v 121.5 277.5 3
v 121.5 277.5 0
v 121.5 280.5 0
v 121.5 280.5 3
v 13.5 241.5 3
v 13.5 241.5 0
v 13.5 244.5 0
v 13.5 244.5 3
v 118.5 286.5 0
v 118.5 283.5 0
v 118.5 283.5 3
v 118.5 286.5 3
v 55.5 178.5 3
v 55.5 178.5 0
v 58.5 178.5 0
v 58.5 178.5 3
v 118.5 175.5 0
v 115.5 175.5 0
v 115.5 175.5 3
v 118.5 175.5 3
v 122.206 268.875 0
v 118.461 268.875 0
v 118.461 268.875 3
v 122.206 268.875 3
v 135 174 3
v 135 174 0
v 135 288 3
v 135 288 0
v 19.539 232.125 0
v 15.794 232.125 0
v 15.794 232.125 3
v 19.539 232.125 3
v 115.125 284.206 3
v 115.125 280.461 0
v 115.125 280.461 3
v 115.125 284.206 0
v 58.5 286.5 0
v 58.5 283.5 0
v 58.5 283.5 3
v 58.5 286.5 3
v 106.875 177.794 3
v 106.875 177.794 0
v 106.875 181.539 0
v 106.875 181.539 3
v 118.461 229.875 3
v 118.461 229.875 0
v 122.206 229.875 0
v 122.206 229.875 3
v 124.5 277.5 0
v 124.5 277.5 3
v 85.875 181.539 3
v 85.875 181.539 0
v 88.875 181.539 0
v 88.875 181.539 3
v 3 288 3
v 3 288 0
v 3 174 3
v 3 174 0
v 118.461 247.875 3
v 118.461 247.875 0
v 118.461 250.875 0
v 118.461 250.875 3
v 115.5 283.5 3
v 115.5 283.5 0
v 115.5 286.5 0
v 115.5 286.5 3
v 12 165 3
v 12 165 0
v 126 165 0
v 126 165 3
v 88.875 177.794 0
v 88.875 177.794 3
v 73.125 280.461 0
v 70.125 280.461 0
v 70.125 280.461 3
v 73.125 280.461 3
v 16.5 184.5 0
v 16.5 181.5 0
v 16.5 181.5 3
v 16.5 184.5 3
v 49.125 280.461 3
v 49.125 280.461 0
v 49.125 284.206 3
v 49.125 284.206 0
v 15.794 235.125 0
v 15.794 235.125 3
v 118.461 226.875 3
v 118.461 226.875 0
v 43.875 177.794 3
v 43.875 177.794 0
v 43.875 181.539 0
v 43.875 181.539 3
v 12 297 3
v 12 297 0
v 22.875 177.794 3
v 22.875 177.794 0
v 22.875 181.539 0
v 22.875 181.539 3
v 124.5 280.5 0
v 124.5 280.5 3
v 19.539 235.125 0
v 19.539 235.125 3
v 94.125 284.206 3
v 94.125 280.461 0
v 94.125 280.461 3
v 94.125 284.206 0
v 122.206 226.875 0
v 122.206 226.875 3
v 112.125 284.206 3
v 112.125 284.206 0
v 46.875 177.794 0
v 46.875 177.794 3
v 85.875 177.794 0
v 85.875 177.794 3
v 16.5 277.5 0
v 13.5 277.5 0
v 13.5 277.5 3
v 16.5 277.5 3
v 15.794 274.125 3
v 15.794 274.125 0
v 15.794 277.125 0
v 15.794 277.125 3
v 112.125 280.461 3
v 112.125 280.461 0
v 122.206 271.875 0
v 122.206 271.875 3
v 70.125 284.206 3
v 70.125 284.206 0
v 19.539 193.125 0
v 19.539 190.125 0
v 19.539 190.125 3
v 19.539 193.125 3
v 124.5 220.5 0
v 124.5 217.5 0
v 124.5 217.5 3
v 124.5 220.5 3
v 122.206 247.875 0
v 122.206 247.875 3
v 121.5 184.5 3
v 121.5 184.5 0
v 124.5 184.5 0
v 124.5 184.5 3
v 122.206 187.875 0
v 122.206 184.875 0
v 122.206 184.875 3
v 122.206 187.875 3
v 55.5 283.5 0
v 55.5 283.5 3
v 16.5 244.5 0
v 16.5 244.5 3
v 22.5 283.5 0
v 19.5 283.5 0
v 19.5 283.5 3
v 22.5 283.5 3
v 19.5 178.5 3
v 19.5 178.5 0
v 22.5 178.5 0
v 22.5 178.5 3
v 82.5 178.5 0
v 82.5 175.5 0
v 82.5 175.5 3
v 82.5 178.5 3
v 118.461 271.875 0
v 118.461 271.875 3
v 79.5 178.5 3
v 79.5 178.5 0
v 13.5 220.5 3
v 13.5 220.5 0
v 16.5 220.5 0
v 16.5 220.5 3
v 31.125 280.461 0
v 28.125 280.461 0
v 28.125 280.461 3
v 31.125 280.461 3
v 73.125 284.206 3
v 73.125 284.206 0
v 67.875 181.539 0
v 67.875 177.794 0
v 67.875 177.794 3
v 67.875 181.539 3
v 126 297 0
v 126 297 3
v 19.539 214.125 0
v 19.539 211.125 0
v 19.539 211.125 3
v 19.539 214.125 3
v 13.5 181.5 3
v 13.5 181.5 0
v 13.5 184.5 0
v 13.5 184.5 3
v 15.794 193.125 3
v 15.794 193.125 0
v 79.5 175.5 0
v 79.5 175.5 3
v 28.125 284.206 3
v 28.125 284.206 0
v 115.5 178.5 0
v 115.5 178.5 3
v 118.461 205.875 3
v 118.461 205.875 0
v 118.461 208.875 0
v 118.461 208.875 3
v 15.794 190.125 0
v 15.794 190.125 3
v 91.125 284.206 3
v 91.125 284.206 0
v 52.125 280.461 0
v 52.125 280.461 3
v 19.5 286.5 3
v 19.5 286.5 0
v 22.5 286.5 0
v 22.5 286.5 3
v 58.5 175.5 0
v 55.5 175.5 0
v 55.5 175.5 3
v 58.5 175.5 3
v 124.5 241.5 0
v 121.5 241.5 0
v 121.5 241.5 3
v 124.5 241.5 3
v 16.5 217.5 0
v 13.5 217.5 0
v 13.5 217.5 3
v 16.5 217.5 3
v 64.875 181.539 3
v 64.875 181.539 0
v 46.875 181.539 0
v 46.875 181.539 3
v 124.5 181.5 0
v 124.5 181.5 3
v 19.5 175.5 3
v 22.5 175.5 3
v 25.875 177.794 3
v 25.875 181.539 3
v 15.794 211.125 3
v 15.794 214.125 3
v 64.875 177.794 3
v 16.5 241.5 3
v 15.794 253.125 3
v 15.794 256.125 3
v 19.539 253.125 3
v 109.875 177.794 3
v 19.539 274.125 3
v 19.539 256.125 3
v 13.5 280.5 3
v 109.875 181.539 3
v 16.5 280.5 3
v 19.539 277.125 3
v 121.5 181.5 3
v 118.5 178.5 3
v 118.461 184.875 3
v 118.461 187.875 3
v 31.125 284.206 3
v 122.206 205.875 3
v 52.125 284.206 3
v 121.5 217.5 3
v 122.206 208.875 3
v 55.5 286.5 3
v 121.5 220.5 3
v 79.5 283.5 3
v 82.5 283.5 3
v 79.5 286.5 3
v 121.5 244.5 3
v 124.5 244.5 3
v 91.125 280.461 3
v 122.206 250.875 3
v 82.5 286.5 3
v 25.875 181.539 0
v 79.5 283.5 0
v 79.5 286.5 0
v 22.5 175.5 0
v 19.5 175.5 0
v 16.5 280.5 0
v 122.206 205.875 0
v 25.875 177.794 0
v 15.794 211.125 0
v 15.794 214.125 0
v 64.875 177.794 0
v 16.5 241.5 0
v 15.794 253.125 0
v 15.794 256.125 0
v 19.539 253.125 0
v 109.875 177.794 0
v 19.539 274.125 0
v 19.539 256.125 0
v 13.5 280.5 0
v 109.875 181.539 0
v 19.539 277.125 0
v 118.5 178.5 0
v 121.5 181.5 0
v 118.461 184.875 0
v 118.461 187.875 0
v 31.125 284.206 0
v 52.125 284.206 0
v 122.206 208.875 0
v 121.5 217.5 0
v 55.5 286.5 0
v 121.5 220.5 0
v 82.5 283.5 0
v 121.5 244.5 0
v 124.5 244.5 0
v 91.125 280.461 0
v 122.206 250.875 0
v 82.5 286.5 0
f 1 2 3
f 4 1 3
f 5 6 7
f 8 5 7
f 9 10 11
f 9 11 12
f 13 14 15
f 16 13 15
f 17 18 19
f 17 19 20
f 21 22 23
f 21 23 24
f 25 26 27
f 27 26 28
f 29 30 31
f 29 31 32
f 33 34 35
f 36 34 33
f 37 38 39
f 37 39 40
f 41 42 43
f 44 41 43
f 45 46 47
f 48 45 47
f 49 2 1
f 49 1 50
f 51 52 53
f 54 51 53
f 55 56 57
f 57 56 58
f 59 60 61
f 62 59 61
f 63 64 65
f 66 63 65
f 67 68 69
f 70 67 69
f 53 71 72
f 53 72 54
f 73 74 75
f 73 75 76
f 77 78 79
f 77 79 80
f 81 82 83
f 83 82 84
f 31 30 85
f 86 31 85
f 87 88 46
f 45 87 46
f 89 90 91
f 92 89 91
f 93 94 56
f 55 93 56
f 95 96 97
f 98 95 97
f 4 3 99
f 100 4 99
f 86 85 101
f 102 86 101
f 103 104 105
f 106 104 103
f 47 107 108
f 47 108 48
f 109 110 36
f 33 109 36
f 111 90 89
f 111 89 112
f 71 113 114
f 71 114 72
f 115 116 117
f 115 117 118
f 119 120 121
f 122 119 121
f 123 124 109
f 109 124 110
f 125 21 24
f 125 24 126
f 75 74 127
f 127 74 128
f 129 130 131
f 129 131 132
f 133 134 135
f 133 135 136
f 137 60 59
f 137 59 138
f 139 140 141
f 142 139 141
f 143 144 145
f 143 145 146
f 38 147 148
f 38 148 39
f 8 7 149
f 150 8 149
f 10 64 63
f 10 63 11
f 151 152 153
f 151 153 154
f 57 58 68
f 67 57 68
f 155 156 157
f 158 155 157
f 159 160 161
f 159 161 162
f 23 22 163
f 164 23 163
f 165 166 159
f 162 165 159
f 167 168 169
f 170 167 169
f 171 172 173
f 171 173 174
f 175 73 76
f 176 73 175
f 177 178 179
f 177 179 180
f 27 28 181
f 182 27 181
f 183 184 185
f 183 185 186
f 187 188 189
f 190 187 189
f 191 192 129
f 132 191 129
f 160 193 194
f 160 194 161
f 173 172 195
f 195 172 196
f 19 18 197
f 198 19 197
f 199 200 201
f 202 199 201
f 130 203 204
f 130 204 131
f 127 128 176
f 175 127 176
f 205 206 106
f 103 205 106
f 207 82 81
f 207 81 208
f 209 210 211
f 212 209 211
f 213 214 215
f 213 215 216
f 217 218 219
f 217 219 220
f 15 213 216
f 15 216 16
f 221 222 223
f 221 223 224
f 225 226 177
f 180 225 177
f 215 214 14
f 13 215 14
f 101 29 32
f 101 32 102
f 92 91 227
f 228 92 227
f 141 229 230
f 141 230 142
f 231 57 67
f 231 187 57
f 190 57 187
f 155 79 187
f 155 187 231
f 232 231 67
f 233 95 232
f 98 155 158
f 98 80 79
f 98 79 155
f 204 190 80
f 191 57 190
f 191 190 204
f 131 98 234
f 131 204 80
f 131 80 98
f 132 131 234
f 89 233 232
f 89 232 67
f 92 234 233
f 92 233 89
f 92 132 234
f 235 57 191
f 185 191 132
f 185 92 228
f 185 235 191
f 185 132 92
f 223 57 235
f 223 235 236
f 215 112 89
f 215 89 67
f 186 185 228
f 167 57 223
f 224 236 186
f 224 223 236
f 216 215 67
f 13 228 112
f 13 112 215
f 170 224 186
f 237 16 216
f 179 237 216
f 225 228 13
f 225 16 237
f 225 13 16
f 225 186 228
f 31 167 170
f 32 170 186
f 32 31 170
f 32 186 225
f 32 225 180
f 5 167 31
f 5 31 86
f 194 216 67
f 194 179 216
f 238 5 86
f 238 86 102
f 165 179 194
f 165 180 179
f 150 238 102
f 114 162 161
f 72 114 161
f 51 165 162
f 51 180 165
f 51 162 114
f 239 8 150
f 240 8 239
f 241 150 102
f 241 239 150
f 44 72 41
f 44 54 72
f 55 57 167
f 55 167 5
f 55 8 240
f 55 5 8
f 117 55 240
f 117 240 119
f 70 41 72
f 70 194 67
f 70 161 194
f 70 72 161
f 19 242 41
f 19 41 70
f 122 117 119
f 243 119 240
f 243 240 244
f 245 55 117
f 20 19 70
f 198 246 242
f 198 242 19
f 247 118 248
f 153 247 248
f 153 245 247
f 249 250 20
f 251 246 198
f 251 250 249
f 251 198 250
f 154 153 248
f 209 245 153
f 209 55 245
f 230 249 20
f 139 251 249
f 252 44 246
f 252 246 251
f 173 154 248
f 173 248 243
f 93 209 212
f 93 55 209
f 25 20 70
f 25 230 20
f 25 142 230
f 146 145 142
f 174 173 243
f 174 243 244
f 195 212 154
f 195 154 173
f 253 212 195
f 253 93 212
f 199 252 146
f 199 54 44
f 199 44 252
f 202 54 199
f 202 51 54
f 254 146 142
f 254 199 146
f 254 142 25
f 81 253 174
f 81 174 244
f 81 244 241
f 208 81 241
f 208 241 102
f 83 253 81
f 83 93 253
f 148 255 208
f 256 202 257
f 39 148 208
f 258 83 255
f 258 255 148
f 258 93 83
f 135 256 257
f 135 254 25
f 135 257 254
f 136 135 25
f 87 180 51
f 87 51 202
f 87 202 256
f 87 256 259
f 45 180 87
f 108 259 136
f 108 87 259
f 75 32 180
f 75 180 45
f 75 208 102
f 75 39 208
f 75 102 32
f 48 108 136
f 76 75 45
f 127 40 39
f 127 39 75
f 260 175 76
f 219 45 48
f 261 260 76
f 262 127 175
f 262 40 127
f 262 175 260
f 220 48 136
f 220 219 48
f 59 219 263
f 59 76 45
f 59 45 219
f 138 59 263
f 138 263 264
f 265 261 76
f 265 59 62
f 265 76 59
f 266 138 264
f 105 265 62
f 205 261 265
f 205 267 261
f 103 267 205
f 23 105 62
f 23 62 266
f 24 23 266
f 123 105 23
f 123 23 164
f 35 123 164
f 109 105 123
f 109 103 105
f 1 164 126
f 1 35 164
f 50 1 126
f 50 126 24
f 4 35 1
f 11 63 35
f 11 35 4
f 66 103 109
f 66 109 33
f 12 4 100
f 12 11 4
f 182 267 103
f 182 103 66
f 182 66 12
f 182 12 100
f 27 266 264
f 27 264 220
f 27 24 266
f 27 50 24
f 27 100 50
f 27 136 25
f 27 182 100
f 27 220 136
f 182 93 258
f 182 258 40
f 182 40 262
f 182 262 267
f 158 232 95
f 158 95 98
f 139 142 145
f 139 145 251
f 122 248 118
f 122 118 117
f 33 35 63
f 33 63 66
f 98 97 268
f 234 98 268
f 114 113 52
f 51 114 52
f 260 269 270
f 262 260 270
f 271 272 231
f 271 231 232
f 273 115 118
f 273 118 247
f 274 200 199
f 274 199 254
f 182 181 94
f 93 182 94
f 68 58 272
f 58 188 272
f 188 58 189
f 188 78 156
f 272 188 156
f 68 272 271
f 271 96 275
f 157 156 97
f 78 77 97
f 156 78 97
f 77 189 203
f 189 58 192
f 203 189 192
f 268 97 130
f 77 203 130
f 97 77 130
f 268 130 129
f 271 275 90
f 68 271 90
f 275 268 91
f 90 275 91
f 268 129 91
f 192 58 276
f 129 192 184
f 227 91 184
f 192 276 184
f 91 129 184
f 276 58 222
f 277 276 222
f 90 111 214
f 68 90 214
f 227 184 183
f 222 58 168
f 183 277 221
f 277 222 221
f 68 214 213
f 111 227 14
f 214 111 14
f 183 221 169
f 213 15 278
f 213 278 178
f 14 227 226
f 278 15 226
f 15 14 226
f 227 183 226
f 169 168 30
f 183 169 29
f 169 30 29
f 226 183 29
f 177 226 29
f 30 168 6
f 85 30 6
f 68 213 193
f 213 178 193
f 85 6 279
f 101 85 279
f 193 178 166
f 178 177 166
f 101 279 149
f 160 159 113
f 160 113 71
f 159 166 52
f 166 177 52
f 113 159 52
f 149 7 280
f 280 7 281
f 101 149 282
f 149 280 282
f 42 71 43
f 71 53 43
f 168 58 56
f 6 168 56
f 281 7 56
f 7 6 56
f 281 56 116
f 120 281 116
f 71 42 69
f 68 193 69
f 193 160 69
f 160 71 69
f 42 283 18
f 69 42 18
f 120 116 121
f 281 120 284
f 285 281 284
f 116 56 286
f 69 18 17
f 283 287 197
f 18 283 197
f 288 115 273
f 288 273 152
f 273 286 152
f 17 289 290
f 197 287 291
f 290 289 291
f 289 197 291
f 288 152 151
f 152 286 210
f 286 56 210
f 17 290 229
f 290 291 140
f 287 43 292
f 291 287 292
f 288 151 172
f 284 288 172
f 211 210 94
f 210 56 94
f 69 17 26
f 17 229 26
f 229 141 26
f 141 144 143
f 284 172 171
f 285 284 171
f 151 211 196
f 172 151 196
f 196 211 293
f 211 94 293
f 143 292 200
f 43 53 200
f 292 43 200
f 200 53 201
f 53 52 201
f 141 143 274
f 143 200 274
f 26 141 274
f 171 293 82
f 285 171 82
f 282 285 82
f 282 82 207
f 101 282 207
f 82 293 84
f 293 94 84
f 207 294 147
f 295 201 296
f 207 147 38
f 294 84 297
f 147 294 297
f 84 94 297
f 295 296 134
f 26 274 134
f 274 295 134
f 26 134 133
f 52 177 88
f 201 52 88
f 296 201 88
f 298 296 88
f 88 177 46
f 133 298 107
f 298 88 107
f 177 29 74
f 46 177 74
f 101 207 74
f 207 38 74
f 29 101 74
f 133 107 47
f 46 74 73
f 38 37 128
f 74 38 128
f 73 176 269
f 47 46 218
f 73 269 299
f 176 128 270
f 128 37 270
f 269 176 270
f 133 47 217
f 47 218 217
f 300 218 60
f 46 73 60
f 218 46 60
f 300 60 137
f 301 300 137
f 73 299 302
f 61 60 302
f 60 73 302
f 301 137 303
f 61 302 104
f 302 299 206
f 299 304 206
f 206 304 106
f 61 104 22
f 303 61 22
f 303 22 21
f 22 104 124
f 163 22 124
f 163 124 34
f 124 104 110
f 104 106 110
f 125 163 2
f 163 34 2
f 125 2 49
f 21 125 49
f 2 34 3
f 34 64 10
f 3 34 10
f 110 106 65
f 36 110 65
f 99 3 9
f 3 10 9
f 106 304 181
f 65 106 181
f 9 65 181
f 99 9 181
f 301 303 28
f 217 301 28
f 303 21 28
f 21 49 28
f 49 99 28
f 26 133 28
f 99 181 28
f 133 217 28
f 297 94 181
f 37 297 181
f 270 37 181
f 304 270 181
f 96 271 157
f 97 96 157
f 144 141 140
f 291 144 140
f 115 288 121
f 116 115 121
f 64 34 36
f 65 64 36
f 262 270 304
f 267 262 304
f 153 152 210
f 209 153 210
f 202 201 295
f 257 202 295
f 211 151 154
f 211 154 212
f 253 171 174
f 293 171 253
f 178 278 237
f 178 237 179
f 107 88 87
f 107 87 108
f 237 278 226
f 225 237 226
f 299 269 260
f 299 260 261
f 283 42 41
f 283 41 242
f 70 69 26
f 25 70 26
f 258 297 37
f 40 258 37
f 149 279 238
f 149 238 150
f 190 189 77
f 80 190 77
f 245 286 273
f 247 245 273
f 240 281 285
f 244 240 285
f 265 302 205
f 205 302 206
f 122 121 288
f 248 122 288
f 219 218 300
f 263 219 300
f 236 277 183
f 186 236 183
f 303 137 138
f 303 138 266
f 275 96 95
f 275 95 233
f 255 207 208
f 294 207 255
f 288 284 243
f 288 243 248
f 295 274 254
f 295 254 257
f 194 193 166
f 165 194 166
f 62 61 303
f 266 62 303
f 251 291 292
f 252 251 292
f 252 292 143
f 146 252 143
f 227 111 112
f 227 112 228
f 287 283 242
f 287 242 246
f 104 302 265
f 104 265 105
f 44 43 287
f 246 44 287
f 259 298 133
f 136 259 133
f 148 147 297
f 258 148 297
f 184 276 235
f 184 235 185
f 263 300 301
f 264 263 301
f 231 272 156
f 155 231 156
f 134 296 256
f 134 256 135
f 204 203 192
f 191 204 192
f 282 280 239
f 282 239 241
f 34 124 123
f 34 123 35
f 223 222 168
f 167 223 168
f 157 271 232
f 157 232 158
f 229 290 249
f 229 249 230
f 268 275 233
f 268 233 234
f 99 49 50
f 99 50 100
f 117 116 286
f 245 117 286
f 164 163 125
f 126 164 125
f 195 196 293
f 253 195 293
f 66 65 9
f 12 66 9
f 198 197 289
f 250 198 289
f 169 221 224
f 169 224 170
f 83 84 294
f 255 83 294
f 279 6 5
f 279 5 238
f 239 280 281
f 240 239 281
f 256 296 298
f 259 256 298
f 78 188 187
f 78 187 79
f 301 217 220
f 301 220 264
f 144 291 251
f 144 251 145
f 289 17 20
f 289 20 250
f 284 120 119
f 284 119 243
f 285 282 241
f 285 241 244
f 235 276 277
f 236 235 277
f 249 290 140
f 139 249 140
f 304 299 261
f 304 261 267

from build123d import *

# Parameters (mm, degrees)
SKETCH1_W           = 3
SKETCH1_H           = 3
SKETCH1_W_2         = 3.744317383
SKETCH1_H_2         = 3.744317383
BOSS_EXTRUDE1_DEPTH = 3


with BuildPart() as part:
    # Sketch1 → Boss-Extrude1 (new body)
    with BuildSketch(Plane.XY):
        Polygon((12, 297), (3, 288), (3, 174), (12, 165), (126, 165), (135, 174), (135, 288), (126, 297), align=None)
        with Locations((57, 285)):
            Rectangle(SKETCH1_W, SKETCH1_H, mode=Mode.SUBTRACT)
        with Locations((81, 285)):
            Rectangle(SKETCH1_W, SKETCH1_H, mode=Mode.SUBTRACT)
        with Locations((21, 285)):
            Rectangle(SKETCH1_W, SKETCH1_H, mode=Mode.SUBTRACT)
        with Locations((117, 285)):
            Rectangle(SKETCH1_W, SKETCH1_H, mode=Mode.SUBTRACT)
        with Locations((81, 177)):
            Rectangle(SKETCH1_W, SKETCH1_H, mode=Mode.SUBTRACT)
        with Locations((57, 177)):
            Rectangle(SKETCH1_W, SKETCH1_H, mode=Mode.SUBTRACT)
        with Locations((117, 177)):
            Rectangle(SKETCH1_W, SKETCH1_H, mode=Mode.SUBTRACT)
        with Locations((21, 177)):
            Rectangle(SKETCH1_W, SKETCH1_H, mode=Mode.SUBTRACT)
        with Locations((15, 279)):
            Rectangle(SKETCH1_W, SKETCH1_H, mode=Mode.SUBTRACT)
        with Locations((15, 183)):
            Rectangle(SKETCH1_W, SKETCH1_H, mode=Mode.SUBTRACT)
        with Locations((15, 243)):
            Rectangle(SKETCH1_W, SKETCH1_H, mode=Mode.SUBTRACT)
        with Locations((15, 219)):
            Rectangle(SKETCH1_W, SKETCH1_H, mode=Mode.SUBTRACT)
        with Locations((123, 183)):
            Rectangle(SKETCH1_W, SKETCH1_H, mode=Mode.SUBTRACT)
        with Locations((123, 279)):
            Rectangle(SKETCH1_W, SKETCH1_H, mode=Mode.SUBTRACT)
        with Locations((123, 219)):
            Rectangle(SKETCH1_W, SKETCH1_H, mode=Mode.SUBTRACT)
        with Locations((123, 243)):
            Rectangle(SKETCH1_W, SKETCH1_H, mode=Mode.SUBTRACT)
        with Locations((17.66659907, 212.625)):
            Rectangle(SKETCH1_W_2, SKETCH1_H, mode=Mode.SUBTRACT)
        with Locations((17.66659907, 254.625)):
            Rectangle(SKETCH1_W_2, SKETCH1_H, mode=Mode.SUBTRACT)
        with Locations((17.66659907, 233.625)):
            Rectangle(SKETCH1_W_2, SKETCH1_H, mode=Mode.SUBTRACT)
        with Locations((17.66659907, 275.625)):
            Rectangle(SKETCH1_W_2, SKETCH1_H, mode=Mode.SUBTRACT)
        with Locations((17.66659907, 191.625)):
            Rectangle(SKETCH1_W_2, SKETCH1_H, mode=Mode.SUBTRACT)
        with Locations((87.375, 179.666599071)):
            Rectangle(SKETCH1_W, SKETCH1_H_2, mode=Mode.SUBTRACT)
        with Locations((45.375, 179.666599071)):
            Rectangle(SKETCH1_W, SKETCH1_H_2, mode=Mode.SUBTRACT)
        with Locations((66.375, 179.666599071)):
            Rectangle(SKETCH1_W, SKETCH1_H_2, mode=Mode.SUBTRACT)
        with Locations((24.375, 179.666599071)):
            Rectangle(SKETCH1_W, SKETCH1_H_2, mode=Mode.SUBTRACT)
        with Locations((108.375, 179.666599071)):
            Rectangle(SKETCH1_W, SKETCH1_H_2, mode=Mode.SUBTRACT)
        with Locations((120.33340093, 249.375)):
            Rectangle(SKETCH1_W_2, SKETCH1_H, mode=Mode.SUBTRACT)
        with Locations((120.33340093, 207.375)):
            Rectangle(SKETCH1_W_2, SKETCH1_H, mode=Mode.SUBTRACT)
        with Locations((120.33340093, 228.375)):
            Rectangle(SKETCH1_W_2, SKETCH1_H, mode=Mode.SUBTRACT)
        with Locations((120.33340093, 186.375)):
            Rectangle(SKETCH1_W_2, SKETCH1_H, mode=Mode.SUBTRACT)
        with Locations((120.33340093, 270.375)):
            Rectangle(SKETCH1_W_2, SKETCH1_H, mode=Mode.SUBTRACT)
        with Locations((50.625, 282.33340093)):
            Rectangle(SKETCH1_W, SKETCH1_H_2, mode=Mode.SUBTRACT)
        with Locations((92.625, 282.33340093)):
            Rectangle(SKETCH1_W, SKETCH1_H_2, mode=Mode.SUBTRACT)
        with Locations((71.625, 282.33340093)):
            Rectangle(SKETCH1_W, SKETCH1_H_2, mode=Mode.SUBTRACT)
        with Locations((113.625, 282.33340093)):
            Rectangle(SKETCH1_W, SKETCH1_H_2, mode=Mode.SUBTRACT)
        with Locations((29.625, 282.33340093)):
            Rectangle(SKETCH1_W, SKETCH1_H_2, mode=Mode.SUBTRACT)
    extrude(amount=BOSS_EXTRUDE1_DEPTH)


solid = part.part
